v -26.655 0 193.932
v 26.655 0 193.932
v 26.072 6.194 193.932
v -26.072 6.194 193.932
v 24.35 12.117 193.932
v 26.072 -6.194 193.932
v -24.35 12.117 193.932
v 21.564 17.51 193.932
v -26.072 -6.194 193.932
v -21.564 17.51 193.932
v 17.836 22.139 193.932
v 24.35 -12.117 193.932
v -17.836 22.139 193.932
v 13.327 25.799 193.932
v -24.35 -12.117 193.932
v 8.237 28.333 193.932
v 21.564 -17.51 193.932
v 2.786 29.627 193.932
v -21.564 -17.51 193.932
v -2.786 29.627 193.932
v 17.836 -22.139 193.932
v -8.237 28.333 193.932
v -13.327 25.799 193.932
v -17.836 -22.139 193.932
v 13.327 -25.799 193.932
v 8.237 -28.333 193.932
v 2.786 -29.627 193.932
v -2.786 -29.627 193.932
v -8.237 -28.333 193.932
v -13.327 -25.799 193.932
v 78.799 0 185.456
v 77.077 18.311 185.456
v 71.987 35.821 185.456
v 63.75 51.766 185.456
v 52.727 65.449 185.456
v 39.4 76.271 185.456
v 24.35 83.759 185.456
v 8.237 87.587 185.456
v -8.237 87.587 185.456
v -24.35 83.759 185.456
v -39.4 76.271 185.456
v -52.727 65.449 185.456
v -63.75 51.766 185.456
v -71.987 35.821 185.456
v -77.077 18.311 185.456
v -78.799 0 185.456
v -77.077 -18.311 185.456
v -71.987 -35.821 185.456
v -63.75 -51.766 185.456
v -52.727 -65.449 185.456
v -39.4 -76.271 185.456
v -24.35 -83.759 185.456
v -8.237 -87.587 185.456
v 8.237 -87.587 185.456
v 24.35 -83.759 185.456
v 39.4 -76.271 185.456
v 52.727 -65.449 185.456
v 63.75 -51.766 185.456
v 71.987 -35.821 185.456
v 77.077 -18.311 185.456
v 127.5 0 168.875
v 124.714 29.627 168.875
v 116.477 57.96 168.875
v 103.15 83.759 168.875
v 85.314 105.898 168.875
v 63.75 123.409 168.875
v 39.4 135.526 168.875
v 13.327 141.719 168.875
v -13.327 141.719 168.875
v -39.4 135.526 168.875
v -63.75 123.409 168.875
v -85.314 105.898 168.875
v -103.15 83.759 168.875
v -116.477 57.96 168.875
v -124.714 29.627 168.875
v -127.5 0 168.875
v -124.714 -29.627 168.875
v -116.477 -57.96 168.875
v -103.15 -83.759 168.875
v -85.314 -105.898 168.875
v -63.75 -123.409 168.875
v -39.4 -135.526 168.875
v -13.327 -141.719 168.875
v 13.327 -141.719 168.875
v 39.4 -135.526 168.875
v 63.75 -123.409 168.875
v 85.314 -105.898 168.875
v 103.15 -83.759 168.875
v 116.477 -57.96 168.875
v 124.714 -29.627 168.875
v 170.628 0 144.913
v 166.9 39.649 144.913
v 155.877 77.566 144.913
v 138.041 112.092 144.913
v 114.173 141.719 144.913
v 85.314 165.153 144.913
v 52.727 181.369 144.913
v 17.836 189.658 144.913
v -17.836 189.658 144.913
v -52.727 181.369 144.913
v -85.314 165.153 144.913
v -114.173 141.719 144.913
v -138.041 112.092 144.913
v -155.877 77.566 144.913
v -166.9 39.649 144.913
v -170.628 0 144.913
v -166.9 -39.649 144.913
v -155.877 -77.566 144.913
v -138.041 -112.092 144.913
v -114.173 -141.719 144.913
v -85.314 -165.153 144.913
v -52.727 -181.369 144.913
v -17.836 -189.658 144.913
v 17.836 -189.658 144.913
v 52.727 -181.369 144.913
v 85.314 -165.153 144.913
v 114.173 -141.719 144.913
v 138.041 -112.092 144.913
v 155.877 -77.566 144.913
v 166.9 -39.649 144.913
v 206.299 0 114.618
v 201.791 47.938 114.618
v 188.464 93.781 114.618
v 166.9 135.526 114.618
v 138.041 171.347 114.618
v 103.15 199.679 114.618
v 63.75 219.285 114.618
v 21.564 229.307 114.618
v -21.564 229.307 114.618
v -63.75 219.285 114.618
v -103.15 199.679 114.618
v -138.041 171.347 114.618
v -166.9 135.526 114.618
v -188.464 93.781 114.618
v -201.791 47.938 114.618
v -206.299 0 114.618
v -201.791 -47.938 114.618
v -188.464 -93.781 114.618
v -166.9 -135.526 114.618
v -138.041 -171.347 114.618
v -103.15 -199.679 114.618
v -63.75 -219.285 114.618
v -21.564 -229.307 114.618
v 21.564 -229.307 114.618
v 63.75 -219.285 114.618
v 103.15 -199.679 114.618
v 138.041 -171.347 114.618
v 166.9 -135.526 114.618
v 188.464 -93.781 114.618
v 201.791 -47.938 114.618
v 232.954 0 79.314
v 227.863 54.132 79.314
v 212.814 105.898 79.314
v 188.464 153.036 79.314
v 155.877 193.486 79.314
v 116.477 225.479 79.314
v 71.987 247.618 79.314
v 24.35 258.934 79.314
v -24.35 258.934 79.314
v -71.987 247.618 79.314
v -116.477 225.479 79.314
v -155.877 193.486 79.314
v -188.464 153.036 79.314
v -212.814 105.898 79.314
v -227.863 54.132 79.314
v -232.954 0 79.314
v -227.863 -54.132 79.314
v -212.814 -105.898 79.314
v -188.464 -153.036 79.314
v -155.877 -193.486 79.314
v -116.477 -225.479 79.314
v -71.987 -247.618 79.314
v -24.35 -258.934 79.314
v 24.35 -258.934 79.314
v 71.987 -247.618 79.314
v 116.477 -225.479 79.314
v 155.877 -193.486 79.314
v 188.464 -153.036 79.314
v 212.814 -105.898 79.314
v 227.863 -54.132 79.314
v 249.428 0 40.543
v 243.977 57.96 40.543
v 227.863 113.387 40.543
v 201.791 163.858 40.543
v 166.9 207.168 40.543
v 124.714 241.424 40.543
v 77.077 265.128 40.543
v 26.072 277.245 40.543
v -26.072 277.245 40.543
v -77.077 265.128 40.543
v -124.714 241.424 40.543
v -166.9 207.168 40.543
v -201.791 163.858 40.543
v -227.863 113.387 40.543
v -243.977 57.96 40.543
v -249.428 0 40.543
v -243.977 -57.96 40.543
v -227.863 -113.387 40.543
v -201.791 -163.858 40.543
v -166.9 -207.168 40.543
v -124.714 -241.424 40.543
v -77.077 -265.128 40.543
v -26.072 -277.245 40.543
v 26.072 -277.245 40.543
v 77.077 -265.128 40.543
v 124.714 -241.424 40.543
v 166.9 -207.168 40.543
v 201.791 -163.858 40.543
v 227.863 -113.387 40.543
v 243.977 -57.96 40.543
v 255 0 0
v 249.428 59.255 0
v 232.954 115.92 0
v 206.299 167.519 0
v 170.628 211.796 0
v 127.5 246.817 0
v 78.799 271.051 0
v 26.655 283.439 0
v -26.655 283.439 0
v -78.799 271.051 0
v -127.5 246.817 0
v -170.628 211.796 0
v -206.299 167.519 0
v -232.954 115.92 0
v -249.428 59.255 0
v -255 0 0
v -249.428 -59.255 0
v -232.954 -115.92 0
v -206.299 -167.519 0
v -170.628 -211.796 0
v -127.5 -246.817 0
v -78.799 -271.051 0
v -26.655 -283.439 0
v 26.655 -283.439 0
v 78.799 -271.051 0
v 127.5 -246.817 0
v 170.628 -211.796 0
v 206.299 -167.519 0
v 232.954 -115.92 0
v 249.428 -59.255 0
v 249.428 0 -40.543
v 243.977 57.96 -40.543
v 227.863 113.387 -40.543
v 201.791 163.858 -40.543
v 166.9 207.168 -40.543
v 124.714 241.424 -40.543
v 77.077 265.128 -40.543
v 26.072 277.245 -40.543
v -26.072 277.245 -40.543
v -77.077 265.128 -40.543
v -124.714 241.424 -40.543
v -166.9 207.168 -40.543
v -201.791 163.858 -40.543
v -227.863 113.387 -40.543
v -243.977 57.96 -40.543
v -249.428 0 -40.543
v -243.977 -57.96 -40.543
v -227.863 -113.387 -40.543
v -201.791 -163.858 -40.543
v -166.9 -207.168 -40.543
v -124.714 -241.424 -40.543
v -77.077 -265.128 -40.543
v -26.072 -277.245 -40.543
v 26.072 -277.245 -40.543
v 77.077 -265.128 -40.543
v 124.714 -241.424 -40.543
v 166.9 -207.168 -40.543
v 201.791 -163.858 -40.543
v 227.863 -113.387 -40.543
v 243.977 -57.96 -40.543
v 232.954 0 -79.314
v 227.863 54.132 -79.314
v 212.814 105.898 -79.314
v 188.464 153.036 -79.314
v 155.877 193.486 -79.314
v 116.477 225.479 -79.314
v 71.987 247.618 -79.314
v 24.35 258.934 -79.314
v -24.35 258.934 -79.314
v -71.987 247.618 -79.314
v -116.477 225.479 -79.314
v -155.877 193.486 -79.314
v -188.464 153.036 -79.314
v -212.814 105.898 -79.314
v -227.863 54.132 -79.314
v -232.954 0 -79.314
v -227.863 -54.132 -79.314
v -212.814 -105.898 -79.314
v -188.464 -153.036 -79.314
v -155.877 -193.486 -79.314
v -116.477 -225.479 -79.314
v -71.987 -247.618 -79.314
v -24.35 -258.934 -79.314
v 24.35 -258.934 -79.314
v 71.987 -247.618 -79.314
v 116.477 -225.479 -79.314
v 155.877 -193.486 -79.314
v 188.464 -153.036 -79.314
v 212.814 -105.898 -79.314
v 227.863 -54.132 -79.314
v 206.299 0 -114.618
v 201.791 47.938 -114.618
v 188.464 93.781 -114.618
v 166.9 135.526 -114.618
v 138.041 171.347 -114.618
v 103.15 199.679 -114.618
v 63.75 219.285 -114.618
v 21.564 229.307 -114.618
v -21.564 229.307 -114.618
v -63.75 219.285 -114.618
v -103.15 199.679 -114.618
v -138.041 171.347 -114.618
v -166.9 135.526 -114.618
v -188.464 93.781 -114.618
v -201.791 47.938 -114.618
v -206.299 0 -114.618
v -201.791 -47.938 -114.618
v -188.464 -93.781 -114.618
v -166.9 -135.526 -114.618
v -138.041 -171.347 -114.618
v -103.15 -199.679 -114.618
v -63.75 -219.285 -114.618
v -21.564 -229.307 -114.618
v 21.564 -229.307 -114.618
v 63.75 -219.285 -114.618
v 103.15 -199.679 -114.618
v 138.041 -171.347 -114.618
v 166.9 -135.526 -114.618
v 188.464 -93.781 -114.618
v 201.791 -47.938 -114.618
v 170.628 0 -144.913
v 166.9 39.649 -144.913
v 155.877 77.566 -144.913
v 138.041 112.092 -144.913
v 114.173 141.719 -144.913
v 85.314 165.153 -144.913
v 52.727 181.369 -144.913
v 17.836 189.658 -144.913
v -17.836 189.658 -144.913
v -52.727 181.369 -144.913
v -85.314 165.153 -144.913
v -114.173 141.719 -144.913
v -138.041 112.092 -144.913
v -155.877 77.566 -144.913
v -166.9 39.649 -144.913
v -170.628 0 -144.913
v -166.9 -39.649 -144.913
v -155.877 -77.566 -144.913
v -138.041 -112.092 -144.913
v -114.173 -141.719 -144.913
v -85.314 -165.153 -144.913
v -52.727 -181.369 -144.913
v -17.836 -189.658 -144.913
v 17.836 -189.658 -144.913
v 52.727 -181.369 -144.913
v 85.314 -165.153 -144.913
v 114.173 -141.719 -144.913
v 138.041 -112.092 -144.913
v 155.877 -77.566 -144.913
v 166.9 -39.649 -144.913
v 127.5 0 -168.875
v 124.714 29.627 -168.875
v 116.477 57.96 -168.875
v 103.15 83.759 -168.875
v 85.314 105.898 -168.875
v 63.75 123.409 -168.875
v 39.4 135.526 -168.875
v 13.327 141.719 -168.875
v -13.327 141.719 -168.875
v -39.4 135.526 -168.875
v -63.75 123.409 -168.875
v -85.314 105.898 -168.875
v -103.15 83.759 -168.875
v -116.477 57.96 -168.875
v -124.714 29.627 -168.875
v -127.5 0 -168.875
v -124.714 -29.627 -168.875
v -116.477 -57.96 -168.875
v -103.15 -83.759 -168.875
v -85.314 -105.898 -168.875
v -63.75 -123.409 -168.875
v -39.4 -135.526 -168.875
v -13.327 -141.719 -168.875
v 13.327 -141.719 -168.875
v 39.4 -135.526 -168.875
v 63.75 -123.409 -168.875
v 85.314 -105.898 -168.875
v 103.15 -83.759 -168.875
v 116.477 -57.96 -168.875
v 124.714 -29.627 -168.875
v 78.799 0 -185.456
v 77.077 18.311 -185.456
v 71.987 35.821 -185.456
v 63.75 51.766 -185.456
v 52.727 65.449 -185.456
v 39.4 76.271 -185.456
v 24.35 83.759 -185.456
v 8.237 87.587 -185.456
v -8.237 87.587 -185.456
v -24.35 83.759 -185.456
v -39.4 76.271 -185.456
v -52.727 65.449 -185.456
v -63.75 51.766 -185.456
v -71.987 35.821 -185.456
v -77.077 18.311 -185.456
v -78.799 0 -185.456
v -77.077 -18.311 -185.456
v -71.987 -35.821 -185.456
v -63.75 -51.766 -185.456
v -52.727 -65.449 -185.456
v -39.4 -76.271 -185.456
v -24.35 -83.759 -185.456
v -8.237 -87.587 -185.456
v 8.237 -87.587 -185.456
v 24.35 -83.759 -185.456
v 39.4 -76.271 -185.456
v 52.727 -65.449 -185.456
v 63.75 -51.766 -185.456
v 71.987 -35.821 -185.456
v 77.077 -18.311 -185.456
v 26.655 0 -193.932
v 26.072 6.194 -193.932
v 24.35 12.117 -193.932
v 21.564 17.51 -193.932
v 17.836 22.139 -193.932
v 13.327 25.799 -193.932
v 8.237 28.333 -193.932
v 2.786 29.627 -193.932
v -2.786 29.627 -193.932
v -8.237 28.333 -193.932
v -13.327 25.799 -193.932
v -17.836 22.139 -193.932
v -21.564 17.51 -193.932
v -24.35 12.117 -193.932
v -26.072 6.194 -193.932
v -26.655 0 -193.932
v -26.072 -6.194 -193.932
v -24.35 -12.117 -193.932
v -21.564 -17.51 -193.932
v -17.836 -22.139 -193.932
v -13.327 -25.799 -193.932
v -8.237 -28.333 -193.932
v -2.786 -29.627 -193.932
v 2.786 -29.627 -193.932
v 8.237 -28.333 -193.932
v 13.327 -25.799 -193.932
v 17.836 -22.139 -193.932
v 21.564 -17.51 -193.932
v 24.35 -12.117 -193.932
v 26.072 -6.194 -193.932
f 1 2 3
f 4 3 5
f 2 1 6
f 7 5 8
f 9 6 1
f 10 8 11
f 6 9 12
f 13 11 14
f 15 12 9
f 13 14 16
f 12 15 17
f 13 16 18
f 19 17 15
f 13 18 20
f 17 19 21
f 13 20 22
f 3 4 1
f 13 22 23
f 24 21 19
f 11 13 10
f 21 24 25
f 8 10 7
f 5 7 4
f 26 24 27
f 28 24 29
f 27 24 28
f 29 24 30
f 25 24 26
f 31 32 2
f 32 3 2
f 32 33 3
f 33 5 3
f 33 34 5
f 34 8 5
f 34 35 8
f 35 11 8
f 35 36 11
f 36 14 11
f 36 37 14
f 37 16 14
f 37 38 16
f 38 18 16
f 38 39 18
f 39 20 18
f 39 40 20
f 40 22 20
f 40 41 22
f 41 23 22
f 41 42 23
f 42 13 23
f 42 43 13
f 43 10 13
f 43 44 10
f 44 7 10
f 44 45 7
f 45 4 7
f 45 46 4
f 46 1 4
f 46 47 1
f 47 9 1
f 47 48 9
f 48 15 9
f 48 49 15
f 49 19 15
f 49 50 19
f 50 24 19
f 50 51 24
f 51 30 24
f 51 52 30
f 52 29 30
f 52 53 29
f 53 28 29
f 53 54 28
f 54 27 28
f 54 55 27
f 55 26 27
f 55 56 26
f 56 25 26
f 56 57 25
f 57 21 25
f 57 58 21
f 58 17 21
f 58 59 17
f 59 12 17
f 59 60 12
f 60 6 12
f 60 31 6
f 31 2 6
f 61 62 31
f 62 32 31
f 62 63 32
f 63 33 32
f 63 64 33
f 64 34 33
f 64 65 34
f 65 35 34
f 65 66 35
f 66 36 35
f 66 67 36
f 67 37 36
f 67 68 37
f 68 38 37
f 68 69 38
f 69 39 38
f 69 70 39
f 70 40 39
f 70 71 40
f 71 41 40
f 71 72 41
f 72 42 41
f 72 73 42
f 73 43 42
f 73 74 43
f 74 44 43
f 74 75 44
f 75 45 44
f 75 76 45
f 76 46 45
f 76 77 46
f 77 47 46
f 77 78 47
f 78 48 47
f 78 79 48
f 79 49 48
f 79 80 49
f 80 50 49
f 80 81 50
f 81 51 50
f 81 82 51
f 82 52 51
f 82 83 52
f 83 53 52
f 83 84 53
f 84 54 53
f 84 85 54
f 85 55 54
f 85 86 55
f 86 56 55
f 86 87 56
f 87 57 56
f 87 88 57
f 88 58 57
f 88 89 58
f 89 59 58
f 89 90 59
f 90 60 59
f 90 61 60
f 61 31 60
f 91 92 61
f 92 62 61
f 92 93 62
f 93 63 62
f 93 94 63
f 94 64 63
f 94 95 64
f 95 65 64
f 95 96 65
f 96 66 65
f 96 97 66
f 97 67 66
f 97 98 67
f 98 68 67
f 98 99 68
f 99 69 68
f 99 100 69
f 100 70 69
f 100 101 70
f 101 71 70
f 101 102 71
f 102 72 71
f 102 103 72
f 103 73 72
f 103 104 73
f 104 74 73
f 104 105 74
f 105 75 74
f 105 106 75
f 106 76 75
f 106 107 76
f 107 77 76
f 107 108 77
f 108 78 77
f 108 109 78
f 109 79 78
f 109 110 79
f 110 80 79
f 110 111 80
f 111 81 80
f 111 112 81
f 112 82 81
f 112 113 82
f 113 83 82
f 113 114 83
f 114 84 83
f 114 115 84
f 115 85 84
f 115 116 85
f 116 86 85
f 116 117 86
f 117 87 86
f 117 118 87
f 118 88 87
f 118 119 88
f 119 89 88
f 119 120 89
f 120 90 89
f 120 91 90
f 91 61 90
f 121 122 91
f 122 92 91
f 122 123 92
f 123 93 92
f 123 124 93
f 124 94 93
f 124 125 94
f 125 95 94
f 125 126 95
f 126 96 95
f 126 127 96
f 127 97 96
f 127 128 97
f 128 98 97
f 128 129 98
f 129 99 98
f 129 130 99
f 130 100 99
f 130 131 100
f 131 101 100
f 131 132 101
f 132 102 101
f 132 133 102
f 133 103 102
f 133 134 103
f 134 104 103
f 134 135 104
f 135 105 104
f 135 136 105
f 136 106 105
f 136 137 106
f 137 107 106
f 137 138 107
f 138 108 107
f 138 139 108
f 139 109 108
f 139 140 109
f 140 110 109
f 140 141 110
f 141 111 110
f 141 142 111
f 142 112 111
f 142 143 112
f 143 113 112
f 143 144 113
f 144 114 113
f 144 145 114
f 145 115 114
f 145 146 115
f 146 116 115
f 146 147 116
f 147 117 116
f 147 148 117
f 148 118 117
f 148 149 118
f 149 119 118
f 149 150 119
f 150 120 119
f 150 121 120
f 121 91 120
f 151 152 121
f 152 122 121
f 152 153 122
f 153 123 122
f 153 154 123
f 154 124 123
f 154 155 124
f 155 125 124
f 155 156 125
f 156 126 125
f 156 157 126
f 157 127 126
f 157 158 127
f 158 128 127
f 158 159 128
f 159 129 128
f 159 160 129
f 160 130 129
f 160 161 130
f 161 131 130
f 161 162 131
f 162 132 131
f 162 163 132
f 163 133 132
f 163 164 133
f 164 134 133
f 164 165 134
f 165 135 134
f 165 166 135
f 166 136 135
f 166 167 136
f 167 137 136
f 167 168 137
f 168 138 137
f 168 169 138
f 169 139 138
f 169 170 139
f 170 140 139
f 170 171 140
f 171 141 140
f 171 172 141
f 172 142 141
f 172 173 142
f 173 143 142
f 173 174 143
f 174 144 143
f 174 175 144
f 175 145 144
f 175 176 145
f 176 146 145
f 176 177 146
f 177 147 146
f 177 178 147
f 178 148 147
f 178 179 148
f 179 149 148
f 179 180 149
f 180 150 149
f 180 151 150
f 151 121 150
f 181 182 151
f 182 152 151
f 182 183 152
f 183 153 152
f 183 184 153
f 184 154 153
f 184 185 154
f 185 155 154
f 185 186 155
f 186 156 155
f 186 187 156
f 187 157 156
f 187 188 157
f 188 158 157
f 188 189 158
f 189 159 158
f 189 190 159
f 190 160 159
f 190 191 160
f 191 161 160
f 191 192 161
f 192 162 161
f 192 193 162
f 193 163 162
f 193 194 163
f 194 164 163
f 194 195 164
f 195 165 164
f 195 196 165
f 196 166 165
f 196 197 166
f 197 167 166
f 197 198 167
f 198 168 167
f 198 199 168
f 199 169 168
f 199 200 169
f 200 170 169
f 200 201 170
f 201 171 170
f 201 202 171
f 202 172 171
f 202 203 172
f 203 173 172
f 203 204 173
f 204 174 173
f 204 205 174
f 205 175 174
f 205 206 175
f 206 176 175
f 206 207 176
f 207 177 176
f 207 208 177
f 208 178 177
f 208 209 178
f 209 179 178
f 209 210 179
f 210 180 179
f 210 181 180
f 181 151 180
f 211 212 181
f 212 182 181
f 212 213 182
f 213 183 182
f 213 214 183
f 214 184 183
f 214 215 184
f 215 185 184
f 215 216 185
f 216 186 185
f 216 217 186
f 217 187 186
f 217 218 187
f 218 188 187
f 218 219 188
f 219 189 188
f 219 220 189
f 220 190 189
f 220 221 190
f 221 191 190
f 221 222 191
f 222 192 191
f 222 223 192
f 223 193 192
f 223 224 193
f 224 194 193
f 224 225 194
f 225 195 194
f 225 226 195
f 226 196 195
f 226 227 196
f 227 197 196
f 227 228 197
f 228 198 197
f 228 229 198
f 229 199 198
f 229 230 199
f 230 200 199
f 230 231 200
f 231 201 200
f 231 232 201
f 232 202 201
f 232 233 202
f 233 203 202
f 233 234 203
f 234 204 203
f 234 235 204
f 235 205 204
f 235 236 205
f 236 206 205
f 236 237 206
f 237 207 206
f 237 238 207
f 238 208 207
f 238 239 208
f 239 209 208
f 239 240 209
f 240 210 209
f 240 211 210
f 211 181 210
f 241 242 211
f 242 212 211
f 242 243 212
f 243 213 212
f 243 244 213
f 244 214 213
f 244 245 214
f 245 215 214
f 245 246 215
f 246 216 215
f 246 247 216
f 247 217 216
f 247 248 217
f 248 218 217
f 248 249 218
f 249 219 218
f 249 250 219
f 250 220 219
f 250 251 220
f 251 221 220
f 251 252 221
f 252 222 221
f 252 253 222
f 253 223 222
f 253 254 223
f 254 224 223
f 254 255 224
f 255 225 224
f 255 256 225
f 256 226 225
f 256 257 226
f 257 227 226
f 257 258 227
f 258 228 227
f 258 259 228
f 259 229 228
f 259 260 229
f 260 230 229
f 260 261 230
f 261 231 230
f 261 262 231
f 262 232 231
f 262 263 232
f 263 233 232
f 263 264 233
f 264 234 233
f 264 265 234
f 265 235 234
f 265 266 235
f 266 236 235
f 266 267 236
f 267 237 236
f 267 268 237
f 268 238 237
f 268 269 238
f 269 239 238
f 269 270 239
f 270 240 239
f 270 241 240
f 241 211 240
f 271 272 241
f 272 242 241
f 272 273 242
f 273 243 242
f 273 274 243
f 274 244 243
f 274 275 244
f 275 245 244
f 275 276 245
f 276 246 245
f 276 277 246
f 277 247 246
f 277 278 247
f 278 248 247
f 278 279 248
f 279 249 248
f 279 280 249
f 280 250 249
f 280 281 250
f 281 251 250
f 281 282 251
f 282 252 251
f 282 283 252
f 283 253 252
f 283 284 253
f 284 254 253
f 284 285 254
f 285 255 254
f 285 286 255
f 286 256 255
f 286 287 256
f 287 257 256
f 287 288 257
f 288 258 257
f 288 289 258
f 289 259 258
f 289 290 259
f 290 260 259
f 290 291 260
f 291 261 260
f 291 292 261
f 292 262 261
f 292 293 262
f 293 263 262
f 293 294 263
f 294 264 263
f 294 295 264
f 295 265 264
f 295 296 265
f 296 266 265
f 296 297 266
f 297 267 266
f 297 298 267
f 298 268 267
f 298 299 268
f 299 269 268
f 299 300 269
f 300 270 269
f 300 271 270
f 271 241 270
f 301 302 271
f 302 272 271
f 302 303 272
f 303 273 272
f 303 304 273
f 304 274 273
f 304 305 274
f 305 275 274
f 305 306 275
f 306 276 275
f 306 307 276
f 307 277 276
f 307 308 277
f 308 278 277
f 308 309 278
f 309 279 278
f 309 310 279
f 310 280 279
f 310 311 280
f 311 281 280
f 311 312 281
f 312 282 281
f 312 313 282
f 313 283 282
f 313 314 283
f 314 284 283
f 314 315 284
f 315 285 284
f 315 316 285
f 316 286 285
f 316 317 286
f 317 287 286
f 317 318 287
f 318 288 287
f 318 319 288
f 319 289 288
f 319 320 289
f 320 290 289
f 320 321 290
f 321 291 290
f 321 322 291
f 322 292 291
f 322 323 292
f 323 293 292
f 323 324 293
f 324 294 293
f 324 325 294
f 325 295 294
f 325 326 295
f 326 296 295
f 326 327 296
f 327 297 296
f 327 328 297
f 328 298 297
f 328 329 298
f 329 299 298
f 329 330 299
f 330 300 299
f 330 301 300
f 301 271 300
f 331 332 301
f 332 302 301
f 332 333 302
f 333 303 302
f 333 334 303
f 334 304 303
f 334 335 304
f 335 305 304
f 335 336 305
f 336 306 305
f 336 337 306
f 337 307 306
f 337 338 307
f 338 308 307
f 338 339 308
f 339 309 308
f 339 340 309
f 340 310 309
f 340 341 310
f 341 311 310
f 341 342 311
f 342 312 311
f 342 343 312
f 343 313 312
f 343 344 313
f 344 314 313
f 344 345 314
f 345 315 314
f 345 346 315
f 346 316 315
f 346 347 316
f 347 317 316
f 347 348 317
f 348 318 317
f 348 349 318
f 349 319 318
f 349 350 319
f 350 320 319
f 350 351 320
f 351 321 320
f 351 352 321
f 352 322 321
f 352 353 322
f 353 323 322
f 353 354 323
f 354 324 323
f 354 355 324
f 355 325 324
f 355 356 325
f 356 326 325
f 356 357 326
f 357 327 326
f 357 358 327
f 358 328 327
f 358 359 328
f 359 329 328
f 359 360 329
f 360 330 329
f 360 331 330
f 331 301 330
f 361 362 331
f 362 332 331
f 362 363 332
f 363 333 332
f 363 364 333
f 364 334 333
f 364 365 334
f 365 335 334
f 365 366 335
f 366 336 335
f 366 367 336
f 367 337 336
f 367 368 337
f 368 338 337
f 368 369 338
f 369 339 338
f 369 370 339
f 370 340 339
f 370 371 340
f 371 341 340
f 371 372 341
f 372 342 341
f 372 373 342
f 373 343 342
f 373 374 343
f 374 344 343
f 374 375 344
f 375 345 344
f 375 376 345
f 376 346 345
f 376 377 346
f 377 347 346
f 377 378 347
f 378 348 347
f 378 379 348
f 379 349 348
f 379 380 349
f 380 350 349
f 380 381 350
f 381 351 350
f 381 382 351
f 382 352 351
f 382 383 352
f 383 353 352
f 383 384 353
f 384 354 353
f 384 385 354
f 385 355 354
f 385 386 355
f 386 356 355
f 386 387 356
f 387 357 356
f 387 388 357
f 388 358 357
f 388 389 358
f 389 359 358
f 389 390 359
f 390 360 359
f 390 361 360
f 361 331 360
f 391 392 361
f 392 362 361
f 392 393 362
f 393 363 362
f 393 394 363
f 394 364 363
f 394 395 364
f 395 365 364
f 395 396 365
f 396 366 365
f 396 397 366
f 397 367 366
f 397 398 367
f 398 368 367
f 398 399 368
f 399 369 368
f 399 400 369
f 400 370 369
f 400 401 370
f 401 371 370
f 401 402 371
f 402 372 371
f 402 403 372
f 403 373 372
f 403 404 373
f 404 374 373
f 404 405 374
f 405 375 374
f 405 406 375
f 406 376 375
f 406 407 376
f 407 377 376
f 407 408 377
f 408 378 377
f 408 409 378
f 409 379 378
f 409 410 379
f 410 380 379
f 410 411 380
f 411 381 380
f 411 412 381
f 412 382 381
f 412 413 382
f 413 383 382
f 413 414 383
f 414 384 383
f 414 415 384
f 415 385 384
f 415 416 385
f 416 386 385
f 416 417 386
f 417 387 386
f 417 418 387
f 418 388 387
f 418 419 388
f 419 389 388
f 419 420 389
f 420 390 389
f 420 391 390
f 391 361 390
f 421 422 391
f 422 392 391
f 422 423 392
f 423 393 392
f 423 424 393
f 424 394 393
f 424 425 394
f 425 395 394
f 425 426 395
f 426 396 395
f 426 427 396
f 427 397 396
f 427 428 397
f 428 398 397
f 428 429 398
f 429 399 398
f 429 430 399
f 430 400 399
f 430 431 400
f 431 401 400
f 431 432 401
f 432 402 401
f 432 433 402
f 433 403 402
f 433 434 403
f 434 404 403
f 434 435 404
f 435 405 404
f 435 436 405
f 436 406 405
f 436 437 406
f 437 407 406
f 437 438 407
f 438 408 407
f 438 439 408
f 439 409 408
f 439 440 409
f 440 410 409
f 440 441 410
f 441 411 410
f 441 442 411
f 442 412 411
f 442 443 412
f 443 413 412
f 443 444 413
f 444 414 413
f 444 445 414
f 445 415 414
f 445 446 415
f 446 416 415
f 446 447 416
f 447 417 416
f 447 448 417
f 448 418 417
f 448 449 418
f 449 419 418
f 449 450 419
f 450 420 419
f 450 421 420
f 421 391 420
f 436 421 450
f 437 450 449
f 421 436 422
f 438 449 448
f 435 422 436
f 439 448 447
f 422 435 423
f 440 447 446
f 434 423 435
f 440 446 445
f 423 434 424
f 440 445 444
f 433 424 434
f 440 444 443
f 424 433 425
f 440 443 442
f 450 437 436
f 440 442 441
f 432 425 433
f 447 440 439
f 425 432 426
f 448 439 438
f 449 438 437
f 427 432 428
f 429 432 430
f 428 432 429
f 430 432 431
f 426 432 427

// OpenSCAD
// Generated by SolidPython 1.0.1 on 2020-07-29 00:46:53


scale(v = [17, 19, 13]) {
	sphere(r = 15);
}
/***********************************************
*********      SolidPython code:      **********
************************************************
 
# import packages: SolidPython
from solid import *
from solid.utils import *
from itertools import chain, combinations, permutations


class Resize:

    def __init__(self, scad_file):
        self.scad_file = scad_file
        #self.scad_file = import_scad(scad_file)
        # cone/cylinder param:
        self.r1 = 0
        self.r2 = 0
        self.h = 0
        # rectangular prism param:
        self.w = 0
        self.l = 0
        # ellipse param:
        self.r = 0

    # import OpenScad code (file name corresponds to shape)


    # classify shape + parameters
    def assign(self, param1, param2, param3):
        if self.scad_file == 'cone.scad':
            self.r1 = param1
            self.r2 = param2
            self.h = param3
        elif self.scad_file == 'cylinder.scad':
            self.r1 = param1
            self.r2 = param2
            self.h = param3
        elif self.scad_file == 'rectangularPrism.scad':
            self.h = param1
            self.l = param2
            self.w = param3
        else:
            self.r = param1
            self.h = param2

    # resize parameters
    def iterate(self):
        x = range(3, 20, 2)
        i = 1
        if self.scad_file == 'cone.scad':
            tempList = list(permutations(x, 2))
            for temp in tempList:
                param1 = temp[0]
                param2 = temp[1]
                filepath = 'produced_scad_files/' + 'cone' + str(param1) + '_' + str(param2) + '_' + '.scad'
                scad_render_to_file(cylinder(h=param1, r1=param2, r2=0), filepath)

        elif self.scad_file == 'cylinder.scad':
            tempList = list(permutations(x, 3))
            for temp in tempList:
                param1 = temp[0]
                param2 = temp[1]
                filepath = 'produced_scad_files/' + 'cylinder' + str(param1) + '_' + str(param2) + '_' + '.scad'
                scad_render_to_file(cylinder(h=param1, r1=param2, r2=param2), filepath)

        elif self.scad_file == 'rectangularPrism.scad':
            tempList = list(permutations(x, 3))
            for temp in tempList:
                param1 = temp[0]
                param2 = temp[1]
                param3 = temp[2]
                filepath = 'produced_scad_files/' + 'rectangularPrism' + str(param1) + '_' + str(param2) + '_' + str(
                    param3) + '.scad'
                scad_render_to_file(cube(size=(param1, param2, param3)), filepath)

        elif self.scad_file == 'ellipse.scad':
            tempList = list(permutations(x, 4))
            for temp in tempList:
                param1 = temp[0]
                param2 = temp[1]
                param3 = temp[2]
                param4 = temp[3]
                filepath = 'produced_scad_files/' + 'ellipse' + str(param1) + '_' + str(param2) + '_' + str(param3) + '_' + str(param4) + '.scad'
                scad_render_to_file(scale([param1, param2, param3])(sphere(r=param4)), filepath)

    def render_to_scadfile(self):
        scad_render_to_file(scad, 'example.scad') 
 
************************************************/
